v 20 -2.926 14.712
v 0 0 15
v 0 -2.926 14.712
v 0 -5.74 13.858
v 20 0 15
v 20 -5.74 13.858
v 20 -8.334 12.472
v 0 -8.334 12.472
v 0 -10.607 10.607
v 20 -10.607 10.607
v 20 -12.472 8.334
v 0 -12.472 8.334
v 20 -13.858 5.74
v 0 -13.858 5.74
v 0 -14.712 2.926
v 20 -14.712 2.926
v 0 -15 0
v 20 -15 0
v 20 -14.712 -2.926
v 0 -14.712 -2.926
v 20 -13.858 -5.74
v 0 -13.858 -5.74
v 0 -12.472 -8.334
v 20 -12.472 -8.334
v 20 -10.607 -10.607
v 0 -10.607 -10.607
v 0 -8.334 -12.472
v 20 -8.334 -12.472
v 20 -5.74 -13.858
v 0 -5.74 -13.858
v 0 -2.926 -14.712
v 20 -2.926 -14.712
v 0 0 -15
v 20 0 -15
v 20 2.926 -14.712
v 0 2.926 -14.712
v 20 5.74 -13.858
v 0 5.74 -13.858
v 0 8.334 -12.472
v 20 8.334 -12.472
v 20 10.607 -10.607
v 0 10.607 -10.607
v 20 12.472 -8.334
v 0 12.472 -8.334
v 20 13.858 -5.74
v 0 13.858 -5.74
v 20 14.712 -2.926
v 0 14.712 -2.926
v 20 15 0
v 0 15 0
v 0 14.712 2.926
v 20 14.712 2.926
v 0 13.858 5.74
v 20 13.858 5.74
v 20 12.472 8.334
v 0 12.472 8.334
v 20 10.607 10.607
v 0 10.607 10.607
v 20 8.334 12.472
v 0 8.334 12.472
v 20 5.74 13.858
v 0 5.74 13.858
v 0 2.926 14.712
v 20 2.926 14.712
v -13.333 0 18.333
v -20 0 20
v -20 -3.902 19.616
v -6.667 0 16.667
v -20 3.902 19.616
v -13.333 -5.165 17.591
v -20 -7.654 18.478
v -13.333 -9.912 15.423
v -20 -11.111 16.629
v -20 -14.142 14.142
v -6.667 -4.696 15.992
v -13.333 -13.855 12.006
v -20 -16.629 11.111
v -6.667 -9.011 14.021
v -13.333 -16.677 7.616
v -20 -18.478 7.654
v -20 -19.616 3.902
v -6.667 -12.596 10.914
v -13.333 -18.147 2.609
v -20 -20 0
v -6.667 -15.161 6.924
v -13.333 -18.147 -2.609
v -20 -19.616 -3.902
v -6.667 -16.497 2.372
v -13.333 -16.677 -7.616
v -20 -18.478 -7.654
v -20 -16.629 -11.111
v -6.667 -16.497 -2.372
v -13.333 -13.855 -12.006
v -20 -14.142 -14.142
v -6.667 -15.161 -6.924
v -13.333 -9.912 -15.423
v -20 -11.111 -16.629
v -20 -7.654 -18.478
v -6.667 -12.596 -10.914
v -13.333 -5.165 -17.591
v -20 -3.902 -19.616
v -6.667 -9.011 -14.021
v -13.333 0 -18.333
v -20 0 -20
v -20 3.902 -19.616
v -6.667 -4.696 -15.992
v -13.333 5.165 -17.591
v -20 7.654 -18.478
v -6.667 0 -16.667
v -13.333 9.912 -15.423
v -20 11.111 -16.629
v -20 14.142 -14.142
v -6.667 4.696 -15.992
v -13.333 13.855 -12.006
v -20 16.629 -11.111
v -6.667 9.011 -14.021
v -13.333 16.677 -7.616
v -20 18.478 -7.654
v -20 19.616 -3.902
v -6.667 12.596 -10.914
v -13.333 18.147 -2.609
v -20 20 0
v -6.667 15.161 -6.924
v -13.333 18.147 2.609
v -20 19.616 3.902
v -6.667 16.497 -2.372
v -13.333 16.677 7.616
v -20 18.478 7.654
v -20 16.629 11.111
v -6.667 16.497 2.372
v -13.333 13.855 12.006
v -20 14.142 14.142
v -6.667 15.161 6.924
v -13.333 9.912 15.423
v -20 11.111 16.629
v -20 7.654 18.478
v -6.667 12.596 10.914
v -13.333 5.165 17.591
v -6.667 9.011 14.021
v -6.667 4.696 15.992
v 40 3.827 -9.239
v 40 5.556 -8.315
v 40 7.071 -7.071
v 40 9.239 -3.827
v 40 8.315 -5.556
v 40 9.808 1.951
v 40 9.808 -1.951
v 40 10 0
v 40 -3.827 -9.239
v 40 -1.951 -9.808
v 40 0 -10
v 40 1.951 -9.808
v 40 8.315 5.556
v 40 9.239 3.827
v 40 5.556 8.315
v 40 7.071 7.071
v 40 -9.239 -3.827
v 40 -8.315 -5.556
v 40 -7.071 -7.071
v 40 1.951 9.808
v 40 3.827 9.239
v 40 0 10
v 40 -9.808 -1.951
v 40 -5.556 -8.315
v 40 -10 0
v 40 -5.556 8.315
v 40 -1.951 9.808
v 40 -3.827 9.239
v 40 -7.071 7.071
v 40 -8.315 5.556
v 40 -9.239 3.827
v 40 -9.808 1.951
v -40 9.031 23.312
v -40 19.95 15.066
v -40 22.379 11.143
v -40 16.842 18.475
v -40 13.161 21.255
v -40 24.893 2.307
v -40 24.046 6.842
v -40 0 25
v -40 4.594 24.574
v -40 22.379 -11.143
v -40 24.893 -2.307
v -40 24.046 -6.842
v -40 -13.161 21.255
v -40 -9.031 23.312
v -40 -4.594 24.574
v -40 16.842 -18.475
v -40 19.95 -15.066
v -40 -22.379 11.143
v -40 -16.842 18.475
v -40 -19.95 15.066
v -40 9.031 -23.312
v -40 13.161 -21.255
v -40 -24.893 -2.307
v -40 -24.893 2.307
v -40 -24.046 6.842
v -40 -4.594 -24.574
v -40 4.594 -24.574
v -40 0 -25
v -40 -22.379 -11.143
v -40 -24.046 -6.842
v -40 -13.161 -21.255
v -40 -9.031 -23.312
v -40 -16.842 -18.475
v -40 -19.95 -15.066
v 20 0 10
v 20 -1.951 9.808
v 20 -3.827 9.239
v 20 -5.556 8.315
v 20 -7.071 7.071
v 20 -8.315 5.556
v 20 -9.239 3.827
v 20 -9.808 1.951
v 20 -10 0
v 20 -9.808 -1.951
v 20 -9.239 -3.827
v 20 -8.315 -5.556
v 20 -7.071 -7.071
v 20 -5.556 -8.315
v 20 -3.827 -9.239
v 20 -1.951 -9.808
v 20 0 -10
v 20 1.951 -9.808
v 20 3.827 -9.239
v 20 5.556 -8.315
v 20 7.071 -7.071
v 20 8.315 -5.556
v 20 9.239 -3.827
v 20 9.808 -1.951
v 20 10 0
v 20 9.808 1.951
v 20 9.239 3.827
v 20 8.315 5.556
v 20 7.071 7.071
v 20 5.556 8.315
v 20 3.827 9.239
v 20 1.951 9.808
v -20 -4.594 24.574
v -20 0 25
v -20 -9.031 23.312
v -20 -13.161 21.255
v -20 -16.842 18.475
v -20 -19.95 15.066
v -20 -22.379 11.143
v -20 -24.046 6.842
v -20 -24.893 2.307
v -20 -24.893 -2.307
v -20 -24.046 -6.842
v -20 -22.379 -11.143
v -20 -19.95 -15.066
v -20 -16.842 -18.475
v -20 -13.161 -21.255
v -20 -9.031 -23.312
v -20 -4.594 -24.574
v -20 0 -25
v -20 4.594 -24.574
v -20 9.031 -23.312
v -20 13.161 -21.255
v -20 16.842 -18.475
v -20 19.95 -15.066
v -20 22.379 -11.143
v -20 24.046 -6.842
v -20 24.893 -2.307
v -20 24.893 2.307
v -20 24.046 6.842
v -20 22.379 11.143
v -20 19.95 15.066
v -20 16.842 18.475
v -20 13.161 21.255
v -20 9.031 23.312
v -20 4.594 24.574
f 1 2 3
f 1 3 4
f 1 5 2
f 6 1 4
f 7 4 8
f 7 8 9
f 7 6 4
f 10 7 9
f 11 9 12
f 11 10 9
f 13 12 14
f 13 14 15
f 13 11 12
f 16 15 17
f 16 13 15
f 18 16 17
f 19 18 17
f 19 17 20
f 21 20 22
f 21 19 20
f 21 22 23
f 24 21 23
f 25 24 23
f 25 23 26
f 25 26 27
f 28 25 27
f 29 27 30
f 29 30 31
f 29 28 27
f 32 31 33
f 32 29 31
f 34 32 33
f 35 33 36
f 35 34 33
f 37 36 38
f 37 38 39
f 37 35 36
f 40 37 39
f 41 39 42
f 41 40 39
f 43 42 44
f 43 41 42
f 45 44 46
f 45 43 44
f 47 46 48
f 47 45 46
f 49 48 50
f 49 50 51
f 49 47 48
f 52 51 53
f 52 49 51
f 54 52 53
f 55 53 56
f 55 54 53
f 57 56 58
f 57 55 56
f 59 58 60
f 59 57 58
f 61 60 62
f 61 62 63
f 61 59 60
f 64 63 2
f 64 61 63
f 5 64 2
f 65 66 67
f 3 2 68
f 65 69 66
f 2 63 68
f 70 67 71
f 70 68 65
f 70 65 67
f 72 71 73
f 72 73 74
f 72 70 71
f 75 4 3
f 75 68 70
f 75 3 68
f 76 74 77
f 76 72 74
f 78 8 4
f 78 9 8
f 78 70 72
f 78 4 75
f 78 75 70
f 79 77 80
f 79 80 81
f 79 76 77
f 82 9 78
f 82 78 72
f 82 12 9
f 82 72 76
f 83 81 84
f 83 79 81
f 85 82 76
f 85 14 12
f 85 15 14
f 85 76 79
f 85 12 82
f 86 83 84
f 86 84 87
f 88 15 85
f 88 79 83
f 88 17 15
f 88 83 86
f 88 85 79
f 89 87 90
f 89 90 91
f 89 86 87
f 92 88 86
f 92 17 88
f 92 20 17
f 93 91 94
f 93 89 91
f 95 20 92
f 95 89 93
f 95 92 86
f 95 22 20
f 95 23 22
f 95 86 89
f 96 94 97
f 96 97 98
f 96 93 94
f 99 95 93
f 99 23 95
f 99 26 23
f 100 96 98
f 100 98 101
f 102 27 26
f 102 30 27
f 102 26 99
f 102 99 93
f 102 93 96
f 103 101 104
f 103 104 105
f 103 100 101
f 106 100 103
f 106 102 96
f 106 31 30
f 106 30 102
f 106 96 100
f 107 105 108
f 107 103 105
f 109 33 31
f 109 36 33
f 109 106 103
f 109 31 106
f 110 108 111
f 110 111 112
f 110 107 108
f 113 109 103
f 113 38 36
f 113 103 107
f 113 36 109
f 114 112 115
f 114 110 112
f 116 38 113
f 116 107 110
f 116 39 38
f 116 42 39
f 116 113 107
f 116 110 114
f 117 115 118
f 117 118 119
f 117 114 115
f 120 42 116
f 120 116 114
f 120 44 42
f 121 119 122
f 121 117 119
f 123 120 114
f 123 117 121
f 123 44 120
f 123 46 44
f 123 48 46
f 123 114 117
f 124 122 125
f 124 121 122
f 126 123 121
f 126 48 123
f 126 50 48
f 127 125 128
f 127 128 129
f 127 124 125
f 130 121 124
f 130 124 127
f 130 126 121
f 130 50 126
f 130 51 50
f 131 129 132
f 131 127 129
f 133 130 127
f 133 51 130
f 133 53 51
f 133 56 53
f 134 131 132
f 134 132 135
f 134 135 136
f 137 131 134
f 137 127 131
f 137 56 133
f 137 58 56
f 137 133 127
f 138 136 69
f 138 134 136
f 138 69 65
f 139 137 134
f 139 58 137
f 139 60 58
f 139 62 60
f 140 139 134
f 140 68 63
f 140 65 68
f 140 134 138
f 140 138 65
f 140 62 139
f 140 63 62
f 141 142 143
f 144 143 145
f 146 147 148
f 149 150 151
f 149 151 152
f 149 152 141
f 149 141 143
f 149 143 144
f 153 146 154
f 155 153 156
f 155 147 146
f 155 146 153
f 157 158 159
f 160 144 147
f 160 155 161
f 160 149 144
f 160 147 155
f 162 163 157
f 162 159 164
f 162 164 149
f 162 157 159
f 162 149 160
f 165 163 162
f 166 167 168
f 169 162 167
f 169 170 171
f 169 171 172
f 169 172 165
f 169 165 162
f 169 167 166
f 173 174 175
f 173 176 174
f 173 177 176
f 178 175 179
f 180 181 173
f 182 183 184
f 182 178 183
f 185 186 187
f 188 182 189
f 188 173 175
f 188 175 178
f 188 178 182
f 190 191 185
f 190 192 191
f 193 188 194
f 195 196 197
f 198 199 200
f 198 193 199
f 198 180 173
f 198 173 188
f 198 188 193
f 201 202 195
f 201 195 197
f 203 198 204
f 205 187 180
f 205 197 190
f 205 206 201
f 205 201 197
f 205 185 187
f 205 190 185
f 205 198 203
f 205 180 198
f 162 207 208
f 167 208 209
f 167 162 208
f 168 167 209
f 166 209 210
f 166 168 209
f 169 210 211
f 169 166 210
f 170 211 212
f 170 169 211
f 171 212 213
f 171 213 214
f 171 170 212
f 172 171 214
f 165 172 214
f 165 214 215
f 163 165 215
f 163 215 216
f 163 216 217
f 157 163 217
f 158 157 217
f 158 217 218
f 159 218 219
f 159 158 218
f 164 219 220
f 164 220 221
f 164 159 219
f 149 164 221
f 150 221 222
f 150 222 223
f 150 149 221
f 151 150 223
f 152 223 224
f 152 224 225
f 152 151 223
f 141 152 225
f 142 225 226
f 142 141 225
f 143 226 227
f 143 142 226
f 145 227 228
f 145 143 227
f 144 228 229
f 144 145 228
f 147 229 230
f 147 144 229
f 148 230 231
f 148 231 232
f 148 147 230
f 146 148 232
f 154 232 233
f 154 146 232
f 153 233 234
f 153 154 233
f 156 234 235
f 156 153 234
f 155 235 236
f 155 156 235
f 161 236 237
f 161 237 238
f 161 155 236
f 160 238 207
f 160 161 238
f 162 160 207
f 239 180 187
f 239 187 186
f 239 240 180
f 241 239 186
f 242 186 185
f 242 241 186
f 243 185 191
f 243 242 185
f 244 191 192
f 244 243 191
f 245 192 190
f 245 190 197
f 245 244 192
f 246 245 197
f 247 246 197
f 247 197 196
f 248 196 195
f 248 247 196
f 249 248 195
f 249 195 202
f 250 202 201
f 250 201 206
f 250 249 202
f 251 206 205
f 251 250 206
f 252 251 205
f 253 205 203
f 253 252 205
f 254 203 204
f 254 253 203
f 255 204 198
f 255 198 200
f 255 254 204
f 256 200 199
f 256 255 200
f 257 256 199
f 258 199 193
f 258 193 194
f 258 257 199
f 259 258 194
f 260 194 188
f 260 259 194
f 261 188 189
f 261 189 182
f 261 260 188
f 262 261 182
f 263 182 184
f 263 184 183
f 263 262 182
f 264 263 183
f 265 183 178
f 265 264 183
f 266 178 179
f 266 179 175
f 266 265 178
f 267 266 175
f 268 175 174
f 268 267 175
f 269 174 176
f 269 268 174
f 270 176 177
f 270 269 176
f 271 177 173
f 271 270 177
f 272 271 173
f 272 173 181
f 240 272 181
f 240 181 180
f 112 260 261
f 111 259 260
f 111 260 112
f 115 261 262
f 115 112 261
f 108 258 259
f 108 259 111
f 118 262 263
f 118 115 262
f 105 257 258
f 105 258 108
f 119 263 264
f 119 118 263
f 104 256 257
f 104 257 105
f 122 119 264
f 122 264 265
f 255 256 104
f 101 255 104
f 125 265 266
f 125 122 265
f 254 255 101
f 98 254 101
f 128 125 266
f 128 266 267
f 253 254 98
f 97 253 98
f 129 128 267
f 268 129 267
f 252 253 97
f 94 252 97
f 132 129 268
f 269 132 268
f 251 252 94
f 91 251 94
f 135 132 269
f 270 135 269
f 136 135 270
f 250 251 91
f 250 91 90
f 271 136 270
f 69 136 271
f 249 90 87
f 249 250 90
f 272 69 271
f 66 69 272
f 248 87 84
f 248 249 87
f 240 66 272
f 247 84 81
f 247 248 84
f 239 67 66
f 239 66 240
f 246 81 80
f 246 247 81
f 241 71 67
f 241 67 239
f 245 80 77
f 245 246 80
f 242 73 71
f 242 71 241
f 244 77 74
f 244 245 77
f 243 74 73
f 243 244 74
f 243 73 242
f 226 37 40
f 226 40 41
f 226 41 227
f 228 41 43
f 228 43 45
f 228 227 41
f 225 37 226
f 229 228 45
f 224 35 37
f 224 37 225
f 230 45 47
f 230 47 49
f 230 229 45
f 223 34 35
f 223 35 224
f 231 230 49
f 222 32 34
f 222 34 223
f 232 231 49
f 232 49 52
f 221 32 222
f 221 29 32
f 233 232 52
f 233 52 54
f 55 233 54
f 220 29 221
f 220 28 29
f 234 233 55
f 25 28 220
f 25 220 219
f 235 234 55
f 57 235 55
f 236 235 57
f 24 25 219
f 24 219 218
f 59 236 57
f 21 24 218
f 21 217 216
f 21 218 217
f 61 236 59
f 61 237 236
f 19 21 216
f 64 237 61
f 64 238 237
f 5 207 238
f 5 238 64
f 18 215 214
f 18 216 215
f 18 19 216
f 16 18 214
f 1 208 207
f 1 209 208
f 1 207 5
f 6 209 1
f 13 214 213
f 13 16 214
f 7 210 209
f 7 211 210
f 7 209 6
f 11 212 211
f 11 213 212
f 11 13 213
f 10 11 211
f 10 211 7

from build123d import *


with BuildPart() as part:
    # 스케치1 → 회전1 (revolve)
    with BuildSketch(Plane(origin=(0, 0, 0), x_dir=(1, 0, 0), z_dir=(0, 1, 0)), mode=Mode.PRIVATE) as revolve_1_sk:
        Polygon((-40, 0), (-40, 25), (-20, 25), (-20, 20), (0, 15), (20, 15), (20, 10), (40, 10), (40, 0), align=None)
    revolve(revolve_1_sk.sketch.rotate(Axis((-49.758874749, 0, 0), (1, 0, 0)), 180), axis=Axis((-49.758874749, 0, 0), (1, 0, 0)))


solid = part.part
